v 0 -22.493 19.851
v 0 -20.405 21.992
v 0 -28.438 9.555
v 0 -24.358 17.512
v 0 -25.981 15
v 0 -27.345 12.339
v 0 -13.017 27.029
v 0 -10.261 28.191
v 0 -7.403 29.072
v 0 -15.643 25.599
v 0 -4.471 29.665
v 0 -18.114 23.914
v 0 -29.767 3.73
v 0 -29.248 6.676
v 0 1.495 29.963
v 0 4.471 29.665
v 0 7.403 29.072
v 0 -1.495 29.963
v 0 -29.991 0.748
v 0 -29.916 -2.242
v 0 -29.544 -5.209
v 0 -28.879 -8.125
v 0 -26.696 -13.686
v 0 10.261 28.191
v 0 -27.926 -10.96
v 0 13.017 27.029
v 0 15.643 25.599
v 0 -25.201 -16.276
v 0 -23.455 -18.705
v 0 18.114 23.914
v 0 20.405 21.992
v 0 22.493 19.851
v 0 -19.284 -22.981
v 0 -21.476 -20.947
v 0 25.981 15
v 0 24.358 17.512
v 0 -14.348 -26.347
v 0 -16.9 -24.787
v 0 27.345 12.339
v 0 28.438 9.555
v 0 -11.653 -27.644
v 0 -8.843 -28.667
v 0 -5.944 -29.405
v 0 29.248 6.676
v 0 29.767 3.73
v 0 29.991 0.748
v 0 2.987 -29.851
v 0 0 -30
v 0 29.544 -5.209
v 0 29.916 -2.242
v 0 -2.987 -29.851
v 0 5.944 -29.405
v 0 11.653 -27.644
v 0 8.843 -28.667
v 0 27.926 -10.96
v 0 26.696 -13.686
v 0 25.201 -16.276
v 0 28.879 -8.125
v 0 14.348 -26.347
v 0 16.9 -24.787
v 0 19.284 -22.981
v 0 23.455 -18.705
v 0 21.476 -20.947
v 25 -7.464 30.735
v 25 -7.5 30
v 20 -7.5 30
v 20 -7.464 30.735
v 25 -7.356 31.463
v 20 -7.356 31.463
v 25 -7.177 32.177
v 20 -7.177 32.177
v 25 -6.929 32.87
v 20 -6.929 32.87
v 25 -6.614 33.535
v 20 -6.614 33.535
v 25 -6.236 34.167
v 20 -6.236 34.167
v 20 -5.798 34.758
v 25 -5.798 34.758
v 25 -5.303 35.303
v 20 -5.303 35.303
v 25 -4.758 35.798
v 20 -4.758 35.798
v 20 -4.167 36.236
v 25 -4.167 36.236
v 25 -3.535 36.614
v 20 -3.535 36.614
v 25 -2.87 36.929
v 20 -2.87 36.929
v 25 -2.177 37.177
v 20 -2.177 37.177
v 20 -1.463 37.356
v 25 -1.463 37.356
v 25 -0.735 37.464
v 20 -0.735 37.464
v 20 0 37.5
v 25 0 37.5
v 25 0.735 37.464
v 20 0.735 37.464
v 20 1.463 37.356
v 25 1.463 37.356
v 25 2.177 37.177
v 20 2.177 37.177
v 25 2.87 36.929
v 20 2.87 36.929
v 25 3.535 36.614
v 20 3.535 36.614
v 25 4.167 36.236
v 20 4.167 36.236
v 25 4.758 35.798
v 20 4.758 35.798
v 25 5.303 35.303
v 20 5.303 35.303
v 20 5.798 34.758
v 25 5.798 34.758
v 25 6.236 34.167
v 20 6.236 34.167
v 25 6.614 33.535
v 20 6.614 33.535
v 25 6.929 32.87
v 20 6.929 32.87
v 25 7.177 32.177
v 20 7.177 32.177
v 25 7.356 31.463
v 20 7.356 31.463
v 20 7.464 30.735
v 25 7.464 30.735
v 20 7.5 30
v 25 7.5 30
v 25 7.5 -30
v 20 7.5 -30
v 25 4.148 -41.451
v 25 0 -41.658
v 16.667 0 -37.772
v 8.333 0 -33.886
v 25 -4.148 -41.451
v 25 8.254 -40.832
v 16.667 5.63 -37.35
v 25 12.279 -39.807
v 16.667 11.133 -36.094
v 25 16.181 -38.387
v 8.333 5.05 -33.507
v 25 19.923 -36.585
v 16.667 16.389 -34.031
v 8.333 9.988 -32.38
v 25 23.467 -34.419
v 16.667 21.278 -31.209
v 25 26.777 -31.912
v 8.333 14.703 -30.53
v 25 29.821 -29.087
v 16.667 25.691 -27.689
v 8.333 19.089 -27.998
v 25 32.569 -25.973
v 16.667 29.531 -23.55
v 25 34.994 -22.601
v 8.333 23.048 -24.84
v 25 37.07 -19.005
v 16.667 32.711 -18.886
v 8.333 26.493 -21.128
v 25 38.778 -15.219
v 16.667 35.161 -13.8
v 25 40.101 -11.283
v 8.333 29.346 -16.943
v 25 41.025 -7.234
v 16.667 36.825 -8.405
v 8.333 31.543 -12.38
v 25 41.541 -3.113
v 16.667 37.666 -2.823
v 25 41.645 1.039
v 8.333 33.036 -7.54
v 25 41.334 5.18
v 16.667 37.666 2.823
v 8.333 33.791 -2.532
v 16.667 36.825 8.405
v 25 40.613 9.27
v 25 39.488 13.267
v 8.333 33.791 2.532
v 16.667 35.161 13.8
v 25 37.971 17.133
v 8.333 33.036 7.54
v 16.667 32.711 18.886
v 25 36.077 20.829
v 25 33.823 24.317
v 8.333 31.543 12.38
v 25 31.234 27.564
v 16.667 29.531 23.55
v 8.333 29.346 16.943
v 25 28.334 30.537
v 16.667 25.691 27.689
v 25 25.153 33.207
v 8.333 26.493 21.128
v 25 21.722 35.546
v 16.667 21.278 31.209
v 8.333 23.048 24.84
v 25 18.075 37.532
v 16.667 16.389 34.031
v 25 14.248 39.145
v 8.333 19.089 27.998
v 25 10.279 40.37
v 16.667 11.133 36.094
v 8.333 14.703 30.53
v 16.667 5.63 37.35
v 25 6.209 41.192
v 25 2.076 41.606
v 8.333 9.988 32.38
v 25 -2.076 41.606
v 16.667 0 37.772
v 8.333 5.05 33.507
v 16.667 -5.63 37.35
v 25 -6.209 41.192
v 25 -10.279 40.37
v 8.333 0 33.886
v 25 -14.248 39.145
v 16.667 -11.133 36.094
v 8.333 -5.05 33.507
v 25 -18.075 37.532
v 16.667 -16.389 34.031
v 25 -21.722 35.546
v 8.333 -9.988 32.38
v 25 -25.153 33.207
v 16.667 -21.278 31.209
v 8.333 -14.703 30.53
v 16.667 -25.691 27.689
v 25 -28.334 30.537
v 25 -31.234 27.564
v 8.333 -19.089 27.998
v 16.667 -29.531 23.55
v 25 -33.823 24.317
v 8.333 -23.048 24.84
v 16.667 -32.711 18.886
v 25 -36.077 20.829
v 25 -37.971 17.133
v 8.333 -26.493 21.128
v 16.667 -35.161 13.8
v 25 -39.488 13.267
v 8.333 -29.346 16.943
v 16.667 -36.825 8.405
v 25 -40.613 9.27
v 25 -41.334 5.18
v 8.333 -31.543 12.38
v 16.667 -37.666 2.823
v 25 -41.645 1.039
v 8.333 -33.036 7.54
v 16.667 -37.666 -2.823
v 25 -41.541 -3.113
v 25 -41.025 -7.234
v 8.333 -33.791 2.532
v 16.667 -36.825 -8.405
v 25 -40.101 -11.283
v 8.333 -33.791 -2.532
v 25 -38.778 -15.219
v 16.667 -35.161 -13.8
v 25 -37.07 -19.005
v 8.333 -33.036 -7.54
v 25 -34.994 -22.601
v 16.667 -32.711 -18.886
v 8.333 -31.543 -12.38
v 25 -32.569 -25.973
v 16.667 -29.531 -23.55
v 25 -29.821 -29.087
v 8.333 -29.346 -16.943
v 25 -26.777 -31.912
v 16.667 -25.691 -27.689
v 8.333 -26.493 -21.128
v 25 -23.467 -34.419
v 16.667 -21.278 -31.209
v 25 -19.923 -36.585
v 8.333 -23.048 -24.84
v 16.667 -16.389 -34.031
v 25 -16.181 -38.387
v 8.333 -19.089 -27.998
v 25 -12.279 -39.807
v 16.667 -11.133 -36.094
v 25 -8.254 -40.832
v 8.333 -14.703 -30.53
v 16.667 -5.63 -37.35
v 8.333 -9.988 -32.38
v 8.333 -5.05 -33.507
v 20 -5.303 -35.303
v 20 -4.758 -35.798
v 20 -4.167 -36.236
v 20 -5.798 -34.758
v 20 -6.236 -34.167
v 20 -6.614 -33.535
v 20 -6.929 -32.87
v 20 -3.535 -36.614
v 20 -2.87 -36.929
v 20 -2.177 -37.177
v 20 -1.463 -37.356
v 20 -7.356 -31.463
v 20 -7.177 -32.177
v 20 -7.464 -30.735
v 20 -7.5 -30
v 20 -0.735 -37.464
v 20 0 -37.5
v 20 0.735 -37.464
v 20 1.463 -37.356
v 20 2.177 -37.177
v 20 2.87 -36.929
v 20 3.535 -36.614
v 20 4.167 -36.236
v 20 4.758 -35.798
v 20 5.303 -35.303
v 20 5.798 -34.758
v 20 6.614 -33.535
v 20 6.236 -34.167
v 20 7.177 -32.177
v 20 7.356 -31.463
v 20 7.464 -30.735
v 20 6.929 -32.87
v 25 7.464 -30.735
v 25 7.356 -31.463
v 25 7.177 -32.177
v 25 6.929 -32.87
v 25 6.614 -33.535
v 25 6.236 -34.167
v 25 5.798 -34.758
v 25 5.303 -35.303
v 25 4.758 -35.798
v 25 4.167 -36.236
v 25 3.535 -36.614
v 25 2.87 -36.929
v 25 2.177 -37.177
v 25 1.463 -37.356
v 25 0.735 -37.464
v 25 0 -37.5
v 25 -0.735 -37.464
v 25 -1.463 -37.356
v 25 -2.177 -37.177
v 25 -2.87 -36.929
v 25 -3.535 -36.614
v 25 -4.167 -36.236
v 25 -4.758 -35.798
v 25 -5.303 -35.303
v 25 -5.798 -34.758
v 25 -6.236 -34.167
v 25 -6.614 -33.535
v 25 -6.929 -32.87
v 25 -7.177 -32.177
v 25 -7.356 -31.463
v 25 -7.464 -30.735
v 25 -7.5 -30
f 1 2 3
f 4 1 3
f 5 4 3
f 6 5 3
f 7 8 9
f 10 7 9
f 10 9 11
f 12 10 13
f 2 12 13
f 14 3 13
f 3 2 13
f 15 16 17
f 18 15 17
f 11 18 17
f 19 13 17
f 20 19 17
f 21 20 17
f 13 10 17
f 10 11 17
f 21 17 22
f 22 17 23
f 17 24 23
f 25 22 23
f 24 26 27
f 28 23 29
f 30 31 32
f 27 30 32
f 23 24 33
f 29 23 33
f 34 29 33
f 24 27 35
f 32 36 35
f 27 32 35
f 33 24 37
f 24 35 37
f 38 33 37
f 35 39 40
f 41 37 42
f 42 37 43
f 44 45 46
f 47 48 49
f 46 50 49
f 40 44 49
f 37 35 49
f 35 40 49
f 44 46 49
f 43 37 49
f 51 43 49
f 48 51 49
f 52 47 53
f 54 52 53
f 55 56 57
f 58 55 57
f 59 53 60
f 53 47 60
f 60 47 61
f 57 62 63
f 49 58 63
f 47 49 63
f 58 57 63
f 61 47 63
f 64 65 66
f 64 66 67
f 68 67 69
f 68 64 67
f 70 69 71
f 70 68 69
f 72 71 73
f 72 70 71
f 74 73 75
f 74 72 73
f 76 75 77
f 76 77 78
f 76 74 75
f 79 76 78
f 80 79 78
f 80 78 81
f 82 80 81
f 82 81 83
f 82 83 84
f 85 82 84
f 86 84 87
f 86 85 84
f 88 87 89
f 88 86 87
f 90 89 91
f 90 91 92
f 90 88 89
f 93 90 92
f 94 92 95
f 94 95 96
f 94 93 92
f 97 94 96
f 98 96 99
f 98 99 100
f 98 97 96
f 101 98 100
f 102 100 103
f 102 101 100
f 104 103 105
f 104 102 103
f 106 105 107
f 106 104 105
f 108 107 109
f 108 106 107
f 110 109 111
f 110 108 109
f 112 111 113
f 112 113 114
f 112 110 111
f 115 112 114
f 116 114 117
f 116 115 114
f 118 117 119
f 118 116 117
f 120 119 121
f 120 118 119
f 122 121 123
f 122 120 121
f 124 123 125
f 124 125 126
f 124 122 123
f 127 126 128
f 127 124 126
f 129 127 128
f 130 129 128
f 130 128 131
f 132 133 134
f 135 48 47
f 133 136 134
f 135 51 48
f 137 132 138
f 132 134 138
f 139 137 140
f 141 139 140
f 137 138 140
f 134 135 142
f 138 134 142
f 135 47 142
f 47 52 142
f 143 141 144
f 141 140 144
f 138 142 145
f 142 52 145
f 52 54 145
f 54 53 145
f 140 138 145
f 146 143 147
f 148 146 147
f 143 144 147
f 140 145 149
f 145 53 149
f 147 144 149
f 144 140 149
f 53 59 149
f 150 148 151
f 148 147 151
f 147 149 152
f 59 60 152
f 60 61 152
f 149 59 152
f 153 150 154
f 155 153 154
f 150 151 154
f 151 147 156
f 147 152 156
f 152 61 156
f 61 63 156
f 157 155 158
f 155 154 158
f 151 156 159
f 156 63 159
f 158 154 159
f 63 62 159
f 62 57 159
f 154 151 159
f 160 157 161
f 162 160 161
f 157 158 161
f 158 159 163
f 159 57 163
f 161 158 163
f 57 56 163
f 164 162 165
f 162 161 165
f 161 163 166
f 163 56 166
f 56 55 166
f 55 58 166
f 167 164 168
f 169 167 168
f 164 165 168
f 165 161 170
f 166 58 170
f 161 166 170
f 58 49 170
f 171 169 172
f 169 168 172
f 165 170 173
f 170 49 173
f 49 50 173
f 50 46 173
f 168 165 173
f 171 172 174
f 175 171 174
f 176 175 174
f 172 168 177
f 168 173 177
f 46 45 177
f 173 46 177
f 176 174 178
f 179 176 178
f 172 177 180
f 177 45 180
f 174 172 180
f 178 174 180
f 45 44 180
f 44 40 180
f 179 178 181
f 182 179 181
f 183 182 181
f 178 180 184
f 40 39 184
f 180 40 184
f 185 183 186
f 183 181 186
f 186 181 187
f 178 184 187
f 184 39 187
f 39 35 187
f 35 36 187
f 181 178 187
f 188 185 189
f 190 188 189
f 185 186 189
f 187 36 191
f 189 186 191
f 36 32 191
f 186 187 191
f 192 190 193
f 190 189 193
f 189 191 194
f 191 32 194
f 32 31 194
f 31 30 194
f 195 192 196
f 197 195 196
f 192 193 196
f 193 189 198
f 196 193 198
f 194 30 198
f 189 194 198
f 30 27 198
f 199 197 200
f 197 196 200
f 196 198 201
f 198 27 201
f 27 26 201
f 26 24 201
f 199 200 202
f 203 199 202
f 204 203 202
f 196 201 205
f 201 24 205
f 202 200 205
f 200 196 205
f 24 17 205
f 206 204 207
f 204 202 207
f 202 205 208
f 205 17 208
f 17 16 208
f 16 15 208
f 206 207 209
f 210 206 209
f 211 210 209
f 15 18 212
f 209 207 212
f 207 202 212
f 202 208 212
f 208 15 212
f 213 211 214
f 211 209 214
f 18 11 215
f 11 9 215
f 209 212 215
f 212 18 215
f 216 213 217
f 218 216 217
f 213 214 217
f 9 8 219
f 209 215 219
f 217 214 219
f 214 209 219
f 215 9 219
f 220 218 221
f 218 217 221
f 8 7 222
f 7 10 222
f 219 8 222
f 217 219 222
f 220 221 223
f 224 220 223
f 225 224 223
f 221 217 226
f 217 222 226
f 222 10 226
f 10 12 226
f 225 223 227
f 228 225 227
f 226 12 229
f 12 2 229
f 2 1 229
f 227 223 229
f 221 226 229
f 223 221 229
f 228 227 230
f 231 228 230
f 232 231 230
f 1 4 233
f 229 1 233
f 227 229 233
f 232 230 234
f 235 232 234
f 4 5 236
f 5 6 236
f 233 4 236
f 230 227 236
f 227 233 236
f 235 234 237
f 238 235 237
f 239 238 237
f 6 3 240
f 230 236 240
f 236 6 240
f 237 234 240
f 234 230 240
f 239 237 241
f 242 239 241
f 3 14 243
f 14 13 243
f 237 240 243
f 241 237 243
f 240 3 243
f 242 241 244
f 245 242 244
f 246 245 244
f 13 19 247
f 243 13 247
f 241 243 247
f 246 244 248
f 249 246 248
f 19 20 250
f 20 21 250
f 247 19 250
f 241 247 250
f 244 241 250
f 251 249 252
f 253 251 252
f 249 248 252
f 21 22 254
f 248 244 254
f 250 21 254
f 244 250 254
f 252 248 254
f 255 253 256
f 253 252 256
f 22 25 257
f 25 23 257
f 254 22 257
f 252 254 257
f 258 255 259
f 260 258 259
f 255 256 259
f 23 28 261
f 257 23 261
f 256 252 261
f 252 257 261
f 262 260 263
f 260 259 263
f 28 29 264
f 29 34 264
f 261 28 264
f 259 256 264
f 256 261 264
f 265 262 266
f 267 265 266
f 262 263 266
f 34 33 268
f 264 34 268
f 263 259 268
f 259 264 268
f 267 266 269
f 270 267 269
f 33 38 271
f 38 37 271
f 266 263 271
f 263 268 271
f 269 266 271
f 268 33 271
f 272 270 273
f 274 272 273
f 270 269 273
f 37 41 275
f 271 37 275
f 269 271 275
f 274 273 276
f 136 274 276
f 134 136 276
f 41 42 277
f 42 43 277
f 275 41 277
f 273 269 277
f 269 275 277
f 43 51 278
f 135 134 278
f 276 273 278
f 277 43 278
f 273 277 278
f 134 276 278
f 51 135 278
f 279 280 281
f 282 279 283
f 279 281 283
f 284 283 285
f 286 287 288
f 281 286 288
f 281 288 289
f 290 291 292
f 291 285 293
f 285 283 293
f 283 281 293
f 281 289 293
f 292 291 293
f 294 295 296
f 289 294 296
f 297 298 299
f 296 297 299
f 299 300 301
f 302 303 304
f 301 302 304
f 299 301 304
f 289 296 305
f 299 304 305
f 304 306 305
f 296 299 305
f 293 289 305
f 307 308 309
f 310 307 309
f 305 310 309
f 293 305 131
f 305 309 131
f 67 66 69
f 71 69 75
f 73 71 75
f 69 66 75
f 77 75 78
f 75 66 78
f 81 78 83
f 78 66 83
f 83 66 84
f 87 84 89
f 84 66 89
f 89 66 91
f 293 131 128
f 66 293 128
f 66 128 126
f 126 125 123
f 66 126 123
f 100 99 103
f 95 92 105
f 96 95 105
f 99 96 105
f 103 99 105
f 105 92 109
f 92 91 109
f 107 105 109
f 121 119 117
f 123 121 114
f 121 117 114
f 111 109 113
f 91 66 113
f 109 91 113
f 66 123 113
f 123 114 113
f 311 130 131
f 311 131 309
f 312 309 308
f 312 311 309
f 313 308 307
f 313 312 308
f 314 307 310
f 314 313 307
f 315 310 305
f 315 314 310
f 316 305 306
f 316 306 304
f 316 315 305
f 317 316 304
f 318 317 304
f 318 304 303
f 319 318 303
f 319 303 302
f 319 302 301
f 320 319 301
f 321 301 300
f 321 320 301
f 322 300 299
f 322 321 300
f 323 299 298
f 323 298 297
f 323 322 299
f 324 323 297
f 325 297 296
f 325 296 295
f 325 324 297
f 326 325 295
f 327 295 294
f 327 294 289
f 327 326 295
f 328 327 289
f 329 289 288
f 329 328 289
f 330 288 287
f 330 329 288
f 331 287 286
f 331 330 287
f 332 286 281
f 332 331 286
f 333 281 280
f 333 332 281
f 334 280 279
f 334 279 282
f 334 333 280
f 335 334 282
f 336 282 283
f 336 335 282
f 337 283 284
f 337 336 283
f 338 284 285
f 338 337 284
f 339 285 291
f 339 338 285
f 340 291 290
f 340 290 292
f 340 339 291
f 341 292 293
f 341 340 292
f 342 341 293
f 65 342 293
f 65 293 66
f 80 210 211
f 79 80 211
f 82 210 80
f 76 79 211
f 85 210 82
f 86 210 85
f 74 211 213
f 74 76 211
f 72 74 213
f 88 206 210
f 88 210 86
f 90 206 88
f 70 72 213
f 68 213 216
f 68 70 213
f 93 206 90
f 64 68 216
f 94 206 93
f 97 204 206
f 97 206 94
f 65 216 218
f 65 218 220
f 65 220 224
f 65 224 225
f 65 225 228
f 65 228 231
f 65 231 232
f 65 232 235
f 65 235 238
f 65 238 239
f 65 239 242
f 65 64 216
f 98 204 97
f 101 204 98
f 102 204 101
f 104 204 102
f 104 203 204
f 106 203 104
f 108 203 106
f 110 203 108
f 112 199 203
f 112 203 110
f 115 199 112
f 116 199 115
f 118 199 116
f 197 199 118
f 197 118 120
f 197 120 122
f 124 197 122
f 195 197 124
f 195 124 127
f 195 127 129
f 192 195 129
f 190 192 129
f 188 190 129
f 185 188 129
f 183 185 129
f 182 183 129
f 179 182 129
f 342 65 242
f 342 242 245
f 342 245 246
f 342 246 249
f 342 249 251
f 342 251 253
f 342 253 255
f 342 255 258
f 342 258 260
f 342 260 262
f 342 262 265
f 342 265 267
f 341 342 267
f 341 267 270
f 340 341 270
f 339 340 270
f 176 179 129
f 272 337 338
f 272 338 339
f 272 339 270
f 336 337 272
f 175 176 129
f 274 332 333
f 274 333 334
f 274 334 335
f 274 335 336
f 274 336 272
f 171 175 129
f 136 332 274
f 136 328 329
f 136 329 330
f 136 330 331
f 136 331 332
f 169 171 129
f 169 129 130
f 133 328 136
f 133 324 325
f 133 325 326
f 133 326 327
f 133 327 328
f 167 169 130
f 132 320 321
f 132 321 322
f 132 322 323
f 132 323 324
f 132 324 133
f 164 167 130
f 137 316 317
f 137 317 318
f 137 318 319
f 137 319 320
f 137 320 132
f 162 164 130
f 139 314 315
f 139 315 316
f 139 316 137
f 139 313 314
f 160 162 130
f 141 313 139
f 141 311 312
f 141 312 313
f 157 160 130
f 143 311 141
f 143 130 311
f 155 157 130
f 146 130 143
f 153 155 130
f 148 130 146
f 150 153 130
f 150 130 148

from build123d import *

# Parameters (mm, degrees)
SKETCH1_R           = 30
BOSS_EXTRUDE1_DEPTH = 25
BOSS_EXTRUDE1_DRAFT = -25
CUT_EXTRUDE1_DEPTH  = 5


with BuildPart() as part:
    # Sketch1 → Boss-Extrude1 (with draft: the straight prism first)
    with BuildSketch(Plane(origin=(0, 0, 0), x_dir=(0, 0, -1), z_dir=(1, 0, 0))):
        Circle(SKETCH1_R)
    extrude(amount=BOSS_EXTRUDE1_DEPTH)
    # Boss-Extrude1: the draft: its side faces are tilted about the plane it starts from
    boss_extrude1_sides = [part.faces().sort_by_distance(p)[0] for p in [
        (12.5, 0, 30),
    ]]
    draft(boss_extrude1_sides, Plane(origin=(0, 0, 0), x_dir=(0, 0, -1), z_dir=(1, 0, 0)), BOSS_EXTRUDE1_DRAFT)

    # Sketch2 → Cut-Extrude1 (cut)
    with BuildSketch(Plane(origin=(25, 0, 0), x_dir=(0, 0, -1), z_dir=(1, 0, 0))):
        with BuildLine():
            Line((-30, 7.5), (30, 7.5))
            ThreePointArc((30, 7.5), (37.5, 0), (30, -7.5))
            Line((30, -7.5), (-30, -7.5))
            ThreePointArc((-30, -7.5), (-37.5, 0), (-30, 7.5))
        make_face()
    extrude(amount=-CUT_EXTRUDE1_DEPTH, mode=Mode.SUBTRACT)


solid = part.part
